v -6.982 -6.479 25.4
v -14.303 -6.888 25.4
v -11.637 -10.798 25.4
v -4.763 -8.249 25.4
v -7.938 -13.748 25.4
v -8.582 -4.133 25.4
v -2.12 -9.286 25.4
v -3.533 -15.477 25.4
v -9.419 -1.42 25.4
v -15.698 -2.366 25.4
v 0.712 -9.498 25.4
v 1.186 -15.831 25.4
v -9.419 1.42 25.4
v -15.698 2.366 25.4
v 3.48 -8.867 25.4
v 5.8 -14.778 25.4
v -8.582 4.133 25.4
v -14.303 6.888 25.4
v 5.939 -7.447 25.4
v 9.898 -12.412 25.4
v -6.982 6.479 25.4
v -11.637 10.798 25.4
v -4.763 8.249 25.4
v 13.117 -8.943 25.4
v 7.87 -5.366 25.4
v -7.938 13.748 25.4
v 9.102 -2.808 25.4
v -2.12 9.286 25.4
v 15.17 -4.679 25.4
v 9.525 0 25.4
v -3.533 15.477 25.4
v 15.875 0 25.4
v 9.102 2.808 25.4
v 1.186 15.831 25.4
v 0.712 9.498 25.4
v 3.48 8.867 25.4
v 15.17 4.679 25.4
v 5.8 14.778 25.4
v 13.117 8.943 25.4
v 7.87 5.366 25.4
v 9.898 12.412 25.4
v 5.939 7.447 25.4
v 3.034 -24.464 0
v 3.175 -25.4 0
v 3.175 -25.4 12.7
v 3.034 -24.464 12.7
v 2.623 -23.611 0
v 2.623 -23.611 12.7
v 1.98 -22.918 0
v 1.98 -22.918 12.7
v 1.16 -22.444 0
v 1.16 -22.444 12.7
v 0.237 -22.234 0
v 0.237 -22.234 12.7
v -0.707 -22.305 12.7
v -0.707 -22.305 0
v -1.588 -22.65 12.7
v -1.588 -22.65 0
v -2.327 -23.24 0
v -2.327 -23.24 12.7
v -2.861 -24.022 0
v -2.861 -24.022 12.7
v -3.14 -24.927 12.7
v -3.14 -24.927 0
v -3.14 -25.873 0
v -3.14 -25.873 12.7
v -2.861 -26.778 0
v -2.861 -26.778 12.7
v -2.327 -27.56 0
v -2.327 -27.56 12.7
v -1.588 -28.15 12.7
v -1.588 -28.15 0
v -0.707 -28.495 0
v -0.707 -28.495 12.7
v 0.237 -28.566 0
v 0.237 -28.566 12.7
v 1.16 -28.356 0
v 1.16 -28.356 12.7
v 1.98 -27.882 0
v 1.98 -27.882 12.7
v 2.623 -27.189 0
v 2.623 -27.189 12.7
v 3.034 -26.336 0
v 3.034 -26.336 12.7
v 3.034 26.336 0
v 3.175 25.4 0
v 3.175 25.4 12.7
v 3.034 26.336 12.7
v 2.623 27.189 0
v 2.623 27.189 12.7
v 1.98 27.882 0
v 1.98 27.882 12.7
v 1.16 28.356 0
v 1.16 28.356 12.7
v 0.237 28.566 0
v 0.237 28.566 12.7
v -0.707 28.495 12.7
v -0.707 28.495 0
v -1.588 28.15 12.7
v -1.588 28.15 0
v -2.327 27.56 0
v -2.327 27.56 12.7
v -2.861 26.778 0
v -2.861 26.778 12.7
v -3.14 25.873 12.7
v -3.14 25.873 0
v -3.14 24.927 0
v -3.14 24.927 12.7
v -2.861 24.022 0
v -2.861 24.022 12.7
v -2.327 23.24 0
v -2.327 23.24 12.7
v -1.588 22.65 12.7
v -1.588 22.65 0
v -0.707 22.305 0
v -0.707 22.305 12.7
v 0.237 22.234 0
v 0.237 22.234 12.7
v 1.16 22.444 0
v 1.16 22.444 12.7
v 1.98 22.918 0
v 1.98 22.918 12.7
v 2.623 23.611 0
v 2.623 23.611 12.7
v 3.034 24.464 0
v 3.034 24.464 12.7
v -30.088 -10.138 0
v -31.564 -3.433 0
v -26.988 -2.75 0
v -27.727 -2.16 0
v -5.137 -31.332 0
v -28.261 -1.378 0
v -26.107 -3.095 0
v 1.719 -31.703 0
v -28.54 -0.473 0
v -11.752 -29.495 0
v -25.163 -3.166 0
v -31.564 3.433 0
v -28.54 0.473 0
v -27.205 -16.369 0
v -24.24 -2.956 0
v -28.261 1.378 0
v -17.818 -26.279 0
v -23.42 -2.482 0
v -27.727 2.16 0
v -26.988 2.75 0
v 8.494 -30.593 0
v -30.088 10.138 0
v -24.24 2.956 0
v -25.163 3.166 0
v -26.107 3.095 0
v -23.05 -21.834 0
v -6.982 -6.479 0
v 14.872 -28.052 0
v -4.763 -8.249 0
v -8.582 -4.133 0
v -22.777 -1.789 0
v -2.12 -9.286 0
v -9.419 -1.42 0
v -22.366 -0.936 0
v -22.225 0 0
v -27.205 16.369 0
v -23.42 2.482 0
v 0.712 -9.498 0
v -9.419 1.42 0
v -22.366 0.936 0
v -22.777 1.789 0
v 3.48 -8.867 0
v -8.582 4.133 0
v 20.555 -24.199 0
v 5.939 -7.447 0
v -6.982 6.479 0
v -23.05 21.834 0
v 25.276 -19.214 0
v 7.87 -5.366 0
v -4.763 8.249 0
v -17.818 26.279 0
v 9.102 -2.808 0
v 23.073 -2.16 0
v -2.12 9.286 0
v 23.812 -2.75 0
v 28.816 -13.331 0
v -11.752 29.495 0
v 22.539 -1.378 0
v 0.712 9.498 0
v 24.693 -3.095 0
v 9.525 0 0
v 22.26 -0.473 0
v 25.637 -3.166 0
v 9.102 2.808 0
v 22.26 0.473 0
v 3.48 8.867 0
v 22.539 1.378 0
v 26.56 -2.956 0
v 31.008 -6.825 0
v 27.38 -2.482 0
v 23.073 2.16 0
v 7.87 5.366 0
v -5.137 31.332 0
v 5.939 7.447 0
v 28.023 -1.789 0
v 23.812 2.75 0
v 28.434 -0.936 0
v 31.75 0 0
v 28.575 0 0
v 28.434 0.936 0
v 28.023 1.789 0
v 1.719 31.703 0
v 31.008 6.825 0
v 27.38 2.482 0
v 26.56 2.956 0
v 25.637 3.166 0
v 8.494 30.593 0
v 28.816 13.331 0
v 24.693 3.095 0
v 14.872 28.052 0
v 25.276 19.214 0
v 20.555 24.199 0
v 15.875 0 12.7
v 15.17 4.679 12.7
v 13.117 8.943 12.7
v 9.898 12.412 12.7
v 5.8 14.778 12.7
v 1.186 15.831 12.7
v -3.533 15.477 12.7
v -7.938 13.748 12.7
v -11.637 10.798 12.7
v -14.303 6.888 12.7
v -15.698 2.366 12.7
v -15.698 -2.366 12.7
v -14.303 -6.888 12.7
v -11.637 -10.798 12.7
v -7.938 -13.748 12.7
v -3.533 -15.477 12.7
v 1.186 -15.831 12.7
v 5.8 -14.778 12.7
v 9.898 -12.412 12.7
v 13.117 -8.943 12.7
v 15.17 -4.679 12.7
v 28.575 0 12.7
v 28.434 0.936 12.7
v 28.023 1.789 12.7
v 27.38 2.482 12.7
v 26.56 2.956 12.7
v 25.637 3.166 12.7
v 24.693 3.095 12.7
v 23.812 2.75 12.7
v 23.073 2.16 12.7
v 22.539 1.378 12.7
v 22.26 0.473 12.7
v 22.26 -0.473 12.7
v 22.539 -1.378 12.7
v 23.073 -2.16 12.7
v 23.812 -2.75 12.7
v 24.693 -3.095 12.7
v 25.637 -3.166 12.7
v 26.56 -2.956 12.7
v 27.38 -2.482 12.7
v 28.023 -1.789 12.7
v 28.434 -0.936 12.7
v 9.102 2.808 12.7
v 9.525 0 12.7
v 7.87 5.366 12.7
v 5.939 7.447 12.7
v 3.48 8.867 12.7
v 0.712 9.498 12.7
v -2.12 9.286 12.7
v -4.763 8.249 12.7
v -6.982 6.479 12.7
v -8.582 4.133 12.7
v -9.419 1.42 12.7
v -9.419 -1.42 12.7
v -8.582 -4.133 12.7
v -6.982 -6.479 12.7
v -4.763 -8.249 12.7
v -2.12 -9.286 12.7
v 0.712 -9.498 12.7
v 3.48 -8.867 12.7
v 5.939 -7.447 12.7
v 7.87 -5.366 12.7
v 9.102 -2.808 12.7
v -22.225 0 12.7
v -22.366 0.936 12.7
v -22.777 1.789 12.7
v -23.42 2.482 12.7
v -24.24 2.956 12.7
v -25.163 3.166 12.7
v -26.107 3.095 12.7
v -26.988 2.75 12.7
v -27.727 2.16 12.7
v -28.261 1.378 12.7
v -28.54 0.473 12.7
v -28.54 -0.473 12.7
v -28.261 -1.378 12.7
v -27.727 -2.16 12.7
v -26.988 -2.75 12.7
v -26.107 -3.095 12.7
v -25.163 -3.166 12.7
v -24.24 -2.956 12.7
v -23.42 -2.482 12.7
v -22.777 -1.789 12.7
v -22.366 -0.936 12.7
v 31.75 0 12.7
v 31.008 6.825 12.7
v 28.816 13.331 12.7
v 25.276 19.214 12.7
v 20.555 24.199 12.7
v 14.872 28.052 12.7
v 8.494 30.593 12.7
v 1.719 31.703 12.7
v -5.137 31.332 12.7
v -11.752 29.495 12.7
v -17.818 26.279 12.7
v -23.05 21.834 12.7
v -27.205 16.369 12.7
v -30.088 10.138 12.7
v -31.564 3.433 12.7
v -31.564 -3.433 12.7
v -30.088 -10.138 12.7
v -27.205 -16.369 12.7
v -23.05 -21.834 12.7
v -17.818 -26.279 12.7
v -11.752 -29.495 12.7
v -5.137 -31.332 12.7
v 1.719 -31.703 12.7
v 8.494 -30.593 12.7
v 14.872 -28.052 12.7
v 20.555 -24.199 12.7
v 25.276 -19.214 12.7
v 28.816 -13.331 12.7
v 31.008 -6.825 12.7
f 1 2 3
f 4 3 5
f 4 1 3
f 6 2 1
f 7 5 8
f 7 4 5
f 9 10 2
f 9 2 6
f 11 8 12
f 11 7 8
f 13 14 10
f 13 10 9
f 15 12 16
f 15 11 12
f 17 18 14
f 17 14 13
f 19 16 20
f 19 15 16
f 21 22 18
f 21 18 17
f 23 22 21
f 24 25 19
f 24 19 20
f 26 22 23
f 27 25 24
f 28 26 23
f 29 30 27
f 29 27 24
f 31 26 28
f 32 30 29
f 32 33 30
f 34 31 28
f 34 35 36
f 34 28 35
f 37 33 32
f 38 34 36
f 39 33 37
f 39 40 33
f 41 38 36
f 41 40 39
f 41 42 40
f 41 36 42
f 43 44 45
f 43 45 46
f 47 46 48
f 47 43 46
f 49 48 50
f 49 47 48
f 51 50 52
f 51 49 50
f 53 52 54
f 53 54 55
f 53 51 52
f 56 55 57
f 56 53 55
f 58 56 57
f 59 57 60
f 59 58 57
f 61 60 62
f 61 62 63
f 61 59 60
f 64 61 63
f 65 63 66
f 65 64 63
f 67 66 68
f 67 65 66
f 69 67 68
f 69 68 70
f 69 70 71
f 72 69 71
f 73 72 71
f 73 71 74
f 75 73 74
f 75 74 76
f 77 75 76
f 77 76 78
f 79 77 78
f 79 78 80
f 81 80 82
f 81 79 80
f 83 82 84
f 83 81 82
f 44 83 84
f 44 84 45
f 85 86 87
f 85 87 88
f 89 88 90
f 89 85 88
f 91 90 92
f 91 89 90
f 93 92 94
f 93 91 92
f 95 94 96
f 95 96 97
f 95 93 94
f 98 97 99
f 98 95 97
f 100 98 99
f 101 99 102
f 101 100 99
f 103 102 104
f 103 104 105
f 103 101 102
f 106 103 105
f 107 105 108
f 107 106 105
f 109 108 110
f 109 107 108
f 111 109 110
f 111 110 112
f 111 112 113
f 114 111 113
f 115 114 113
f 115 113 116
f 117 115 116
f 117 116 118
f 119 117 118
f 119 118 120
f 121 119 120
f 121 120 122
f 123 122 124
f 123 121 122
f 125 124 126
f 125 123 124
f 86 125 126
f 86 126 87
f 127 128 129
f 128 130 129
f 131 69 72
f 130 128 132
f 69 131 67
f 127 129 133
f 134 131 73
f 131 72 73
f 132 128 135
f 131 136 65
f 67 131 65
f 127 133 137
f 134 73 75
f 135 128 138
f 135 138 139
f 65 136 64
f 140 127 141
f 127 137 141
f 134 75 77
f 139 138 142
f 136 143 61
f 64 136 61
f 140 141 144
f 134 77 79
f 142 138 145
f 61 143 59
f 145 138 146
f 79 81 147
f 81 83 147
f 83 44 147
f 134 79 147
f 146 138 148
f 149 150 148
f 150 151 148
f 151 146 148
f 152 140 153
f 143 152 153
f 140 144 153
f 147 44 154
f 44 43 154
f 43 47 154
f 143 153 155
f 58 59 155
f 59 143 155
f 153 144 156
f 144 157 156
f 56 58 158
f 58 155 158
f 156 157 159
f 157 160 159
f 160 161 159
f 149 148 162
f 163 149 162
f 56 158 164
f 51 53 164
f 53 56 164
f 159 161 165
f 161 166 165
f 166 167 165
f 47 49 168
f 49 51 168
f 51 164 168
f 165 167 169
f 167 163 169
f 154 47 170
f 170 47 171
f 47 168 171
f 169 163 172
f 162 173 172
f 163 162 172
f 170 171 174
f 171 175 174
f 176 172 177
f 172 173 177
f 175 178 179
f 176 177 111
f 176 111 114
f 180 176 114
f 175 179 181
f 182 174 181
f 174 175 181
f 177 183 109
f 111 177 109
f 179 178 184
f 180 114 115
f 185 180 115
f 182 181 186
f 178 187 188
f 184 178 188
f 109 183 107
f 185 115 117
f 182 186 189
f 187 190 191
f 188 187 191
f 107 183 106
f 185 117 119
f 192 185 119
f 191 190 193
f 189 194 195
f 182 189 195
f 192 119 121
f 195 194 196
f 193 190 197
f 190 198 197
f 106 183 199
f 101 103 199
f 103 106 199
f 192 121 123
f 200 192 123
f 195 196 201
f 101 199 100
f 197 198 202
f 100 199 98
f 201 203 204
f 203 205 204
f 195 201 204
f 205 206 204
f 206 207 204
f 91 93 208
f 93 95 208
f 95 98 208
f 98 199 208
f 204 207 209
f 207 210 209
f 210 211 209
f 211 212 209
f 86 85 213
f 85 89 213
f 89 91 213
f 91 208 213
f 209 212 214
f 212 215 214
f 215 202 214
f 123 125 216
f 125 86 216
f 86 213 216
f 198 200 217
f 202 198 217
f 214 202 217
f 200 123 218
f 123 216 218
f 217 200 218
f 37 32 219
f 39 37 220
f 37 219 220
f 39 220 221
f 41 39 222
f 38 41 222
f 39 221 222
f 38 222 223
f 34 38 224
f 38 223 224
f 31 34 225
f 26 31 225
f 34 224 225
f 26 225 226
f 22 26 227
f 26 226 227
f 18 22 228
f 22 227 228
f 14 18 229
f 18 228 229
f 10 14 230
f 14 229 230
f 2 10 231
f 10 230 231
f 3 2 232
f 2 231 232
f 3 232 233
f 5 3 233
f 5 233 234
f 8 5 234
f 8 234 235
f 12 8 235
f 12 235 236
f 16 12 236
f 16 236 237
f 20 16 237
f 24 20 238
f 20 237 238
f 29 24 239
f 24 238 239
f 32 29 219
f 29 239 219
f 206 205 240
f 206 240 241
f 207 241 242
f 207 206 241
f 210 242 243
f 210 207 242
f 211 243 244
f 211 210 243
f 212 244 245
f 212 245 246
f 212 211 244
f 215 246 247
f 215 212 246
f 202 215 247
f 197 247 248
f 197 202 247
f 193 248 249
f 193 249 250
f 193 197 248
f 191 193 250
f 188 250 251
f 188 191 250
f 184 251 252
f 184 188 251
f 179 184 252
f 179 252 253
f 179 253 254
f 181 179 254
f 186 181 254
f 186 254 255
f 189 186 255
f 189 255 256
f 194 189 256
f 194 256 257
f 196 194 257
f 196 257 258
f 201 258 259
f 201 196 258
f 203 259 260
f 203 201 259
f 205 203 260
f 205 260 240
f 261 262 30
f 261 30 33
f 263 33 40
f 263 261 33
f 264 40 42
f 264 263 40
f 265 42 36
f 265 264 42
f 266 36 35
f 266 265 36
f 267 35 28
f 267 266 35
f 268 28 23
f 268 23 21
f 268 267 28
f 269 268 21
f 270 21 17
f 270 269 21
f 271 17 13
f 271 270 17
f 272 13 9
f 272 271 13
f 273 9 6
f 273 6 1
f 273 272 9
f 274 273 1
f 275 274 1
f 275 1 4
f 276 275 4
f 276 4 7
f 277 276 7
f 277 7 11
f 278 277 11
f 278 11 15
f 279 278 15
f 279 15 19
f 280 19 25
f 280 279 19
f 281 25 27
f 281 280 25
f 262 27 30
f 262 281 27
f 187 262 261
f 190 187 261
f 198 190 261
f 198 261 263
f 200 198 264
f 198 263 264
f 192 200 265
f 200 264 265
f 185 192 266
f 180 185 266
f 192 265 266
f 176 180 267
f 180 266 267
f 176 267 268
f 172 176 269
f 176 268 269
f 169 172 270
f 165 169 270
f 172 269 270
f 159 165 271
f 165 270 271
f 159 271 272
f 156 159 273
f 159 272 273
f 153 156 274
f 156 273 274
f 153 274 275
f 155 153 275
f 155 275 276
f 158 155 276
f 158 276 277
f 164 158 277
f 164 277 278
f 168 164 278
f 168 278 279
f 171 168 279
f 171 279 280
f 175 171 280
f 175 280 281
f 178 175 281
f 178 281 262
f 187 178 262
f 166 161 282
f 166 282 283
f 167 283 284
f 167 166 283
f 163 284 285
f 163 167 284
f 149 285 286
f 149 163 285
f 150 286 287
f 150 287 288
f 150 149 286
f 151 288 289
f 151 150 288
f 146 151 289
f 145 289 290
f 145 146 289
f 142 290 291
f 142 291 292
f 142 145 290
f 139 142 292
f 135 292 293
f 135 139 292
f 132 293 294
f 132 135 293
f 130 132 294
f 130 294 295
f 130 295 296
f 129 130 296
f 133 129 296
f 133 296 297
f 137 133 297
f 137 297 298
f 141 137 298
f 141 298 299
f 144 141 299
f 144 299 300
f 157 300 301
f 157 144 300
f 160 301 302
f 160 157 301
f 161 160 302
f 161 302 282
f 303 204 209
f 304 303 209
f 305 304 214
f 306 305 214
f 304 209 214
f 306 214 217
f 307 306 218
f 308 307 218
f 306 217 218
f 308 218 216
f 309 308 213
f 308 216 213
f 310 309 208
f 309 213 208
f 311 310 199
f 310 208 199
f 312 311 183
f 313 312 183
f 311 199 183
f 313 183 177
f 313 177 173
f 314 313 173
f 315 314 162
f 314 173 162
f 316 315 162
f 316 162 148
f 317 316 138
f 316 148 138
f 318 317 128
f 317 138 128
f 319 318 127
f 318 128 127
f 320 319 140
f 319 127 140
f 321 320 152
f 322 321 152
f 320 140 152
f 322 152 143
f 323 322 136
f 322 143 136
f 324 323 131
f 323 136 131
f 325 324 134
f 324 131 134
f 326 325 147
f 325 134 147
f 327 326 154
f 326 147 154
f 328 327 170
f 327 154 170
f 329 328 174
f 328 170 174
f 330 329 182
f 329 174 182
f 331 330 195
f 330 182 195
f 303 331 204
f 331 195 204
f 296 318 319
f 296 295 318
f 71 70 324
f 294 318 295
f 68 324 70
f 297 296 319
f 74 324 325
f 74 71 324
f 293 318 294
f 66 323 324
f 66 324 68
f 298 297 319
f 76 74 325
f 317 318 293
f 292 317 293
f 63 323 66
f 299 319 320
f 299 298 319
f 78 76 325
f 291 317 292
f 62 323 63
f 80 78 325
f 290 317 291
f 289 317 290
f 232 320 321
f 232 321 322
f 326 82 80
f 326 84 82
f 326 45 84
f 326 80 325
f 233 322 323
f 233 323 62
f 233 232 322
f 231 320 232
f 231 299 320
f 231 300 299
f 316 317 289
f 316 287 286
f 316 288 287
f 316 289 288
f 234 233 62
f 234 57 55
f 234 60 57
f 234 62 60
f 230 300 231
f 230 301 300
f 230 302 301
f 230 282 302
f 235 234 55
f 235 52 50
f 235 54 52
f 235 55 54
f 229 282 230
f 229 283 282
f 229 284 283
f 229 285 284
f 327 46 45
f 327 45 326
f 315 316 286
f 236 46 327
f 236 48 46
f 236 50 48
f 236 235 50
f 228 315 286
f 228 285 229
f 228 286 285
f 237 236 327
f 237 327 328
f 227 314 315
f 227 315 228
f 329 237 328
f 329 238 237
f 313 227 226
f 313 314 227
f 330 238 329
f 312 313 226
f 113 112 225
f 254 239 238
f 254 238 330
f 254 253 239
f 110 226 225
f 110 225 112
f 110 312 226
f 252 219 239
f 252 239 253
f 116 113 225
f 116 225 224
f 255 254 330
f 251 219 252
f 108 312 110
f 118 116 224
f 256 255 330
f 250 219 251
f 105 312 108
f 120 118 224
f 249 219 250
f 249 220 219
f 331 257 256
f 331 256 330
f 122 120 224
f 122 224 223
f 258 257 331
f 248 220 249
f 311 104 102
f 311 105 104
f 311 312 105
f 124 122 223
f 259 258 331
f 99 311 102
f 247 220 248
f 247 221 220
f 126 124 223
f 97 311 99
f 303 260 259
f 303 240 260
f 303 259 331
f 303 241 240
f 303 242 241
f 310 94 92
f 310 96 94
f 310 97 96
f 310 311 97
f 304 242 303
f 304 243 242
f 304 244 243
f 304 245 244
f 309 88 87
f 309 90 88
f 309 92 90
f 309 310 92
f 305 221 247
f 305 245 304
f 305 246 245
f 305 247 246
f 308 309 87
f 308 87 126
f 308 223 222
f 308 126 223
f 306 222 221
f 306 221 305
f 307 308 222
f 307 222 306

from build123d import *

# Parameters (mm, degrees)
F0_R      = 31.75
F0_R_2    = 3.175
F1_DEPTH  = 12.7
F2_R      = 15.875
F2_R_2    = 9.525
F3_DEPTH  = 12.7
F3_FACE_R = 9.525
F4_DEPTH  = 25.4


with BuildPart() as f1:
    # F0 (on Top) → F1 (new body)
    with BuildSketch(Plane.XY):
        Circle(F0_R)
        with Locations((0, -25.4)):
            Circle(F0_R_2, mode=Mode.SUBTRACT)
        with Locations((-25.4, 0)):
            Circle(F0_R_2, mode=Mode.SUBTRACT)
        with Locations((25.4, 0)):
            Circle(F0_R_2, mode=Mode.SUBTRACT)
        with Locations((0, 25.4)):
            Circle(F0_R_2, mode=Mode.SUBTRACT)
    extrude(amount=F1_DEPTH)

    # F2 (on face) → F3 (join)
    with BuildSketch(Plane.XY.offset(12.7)):
        Circle(F2_R)
        Circle(F2_R_2, mode=Mode.SUBTRACT)
    extrude(amount=F3_DEPTH)

    # F3_face (on face) → F4 (cut)
    with BuildSketch(Plane.XY.offset(12.7)):
        Circle(F3_FACE_R)
    extrude(amount=-F4_DEPTH, mode=Mode.SUBTRACT)


solid = f1.part
